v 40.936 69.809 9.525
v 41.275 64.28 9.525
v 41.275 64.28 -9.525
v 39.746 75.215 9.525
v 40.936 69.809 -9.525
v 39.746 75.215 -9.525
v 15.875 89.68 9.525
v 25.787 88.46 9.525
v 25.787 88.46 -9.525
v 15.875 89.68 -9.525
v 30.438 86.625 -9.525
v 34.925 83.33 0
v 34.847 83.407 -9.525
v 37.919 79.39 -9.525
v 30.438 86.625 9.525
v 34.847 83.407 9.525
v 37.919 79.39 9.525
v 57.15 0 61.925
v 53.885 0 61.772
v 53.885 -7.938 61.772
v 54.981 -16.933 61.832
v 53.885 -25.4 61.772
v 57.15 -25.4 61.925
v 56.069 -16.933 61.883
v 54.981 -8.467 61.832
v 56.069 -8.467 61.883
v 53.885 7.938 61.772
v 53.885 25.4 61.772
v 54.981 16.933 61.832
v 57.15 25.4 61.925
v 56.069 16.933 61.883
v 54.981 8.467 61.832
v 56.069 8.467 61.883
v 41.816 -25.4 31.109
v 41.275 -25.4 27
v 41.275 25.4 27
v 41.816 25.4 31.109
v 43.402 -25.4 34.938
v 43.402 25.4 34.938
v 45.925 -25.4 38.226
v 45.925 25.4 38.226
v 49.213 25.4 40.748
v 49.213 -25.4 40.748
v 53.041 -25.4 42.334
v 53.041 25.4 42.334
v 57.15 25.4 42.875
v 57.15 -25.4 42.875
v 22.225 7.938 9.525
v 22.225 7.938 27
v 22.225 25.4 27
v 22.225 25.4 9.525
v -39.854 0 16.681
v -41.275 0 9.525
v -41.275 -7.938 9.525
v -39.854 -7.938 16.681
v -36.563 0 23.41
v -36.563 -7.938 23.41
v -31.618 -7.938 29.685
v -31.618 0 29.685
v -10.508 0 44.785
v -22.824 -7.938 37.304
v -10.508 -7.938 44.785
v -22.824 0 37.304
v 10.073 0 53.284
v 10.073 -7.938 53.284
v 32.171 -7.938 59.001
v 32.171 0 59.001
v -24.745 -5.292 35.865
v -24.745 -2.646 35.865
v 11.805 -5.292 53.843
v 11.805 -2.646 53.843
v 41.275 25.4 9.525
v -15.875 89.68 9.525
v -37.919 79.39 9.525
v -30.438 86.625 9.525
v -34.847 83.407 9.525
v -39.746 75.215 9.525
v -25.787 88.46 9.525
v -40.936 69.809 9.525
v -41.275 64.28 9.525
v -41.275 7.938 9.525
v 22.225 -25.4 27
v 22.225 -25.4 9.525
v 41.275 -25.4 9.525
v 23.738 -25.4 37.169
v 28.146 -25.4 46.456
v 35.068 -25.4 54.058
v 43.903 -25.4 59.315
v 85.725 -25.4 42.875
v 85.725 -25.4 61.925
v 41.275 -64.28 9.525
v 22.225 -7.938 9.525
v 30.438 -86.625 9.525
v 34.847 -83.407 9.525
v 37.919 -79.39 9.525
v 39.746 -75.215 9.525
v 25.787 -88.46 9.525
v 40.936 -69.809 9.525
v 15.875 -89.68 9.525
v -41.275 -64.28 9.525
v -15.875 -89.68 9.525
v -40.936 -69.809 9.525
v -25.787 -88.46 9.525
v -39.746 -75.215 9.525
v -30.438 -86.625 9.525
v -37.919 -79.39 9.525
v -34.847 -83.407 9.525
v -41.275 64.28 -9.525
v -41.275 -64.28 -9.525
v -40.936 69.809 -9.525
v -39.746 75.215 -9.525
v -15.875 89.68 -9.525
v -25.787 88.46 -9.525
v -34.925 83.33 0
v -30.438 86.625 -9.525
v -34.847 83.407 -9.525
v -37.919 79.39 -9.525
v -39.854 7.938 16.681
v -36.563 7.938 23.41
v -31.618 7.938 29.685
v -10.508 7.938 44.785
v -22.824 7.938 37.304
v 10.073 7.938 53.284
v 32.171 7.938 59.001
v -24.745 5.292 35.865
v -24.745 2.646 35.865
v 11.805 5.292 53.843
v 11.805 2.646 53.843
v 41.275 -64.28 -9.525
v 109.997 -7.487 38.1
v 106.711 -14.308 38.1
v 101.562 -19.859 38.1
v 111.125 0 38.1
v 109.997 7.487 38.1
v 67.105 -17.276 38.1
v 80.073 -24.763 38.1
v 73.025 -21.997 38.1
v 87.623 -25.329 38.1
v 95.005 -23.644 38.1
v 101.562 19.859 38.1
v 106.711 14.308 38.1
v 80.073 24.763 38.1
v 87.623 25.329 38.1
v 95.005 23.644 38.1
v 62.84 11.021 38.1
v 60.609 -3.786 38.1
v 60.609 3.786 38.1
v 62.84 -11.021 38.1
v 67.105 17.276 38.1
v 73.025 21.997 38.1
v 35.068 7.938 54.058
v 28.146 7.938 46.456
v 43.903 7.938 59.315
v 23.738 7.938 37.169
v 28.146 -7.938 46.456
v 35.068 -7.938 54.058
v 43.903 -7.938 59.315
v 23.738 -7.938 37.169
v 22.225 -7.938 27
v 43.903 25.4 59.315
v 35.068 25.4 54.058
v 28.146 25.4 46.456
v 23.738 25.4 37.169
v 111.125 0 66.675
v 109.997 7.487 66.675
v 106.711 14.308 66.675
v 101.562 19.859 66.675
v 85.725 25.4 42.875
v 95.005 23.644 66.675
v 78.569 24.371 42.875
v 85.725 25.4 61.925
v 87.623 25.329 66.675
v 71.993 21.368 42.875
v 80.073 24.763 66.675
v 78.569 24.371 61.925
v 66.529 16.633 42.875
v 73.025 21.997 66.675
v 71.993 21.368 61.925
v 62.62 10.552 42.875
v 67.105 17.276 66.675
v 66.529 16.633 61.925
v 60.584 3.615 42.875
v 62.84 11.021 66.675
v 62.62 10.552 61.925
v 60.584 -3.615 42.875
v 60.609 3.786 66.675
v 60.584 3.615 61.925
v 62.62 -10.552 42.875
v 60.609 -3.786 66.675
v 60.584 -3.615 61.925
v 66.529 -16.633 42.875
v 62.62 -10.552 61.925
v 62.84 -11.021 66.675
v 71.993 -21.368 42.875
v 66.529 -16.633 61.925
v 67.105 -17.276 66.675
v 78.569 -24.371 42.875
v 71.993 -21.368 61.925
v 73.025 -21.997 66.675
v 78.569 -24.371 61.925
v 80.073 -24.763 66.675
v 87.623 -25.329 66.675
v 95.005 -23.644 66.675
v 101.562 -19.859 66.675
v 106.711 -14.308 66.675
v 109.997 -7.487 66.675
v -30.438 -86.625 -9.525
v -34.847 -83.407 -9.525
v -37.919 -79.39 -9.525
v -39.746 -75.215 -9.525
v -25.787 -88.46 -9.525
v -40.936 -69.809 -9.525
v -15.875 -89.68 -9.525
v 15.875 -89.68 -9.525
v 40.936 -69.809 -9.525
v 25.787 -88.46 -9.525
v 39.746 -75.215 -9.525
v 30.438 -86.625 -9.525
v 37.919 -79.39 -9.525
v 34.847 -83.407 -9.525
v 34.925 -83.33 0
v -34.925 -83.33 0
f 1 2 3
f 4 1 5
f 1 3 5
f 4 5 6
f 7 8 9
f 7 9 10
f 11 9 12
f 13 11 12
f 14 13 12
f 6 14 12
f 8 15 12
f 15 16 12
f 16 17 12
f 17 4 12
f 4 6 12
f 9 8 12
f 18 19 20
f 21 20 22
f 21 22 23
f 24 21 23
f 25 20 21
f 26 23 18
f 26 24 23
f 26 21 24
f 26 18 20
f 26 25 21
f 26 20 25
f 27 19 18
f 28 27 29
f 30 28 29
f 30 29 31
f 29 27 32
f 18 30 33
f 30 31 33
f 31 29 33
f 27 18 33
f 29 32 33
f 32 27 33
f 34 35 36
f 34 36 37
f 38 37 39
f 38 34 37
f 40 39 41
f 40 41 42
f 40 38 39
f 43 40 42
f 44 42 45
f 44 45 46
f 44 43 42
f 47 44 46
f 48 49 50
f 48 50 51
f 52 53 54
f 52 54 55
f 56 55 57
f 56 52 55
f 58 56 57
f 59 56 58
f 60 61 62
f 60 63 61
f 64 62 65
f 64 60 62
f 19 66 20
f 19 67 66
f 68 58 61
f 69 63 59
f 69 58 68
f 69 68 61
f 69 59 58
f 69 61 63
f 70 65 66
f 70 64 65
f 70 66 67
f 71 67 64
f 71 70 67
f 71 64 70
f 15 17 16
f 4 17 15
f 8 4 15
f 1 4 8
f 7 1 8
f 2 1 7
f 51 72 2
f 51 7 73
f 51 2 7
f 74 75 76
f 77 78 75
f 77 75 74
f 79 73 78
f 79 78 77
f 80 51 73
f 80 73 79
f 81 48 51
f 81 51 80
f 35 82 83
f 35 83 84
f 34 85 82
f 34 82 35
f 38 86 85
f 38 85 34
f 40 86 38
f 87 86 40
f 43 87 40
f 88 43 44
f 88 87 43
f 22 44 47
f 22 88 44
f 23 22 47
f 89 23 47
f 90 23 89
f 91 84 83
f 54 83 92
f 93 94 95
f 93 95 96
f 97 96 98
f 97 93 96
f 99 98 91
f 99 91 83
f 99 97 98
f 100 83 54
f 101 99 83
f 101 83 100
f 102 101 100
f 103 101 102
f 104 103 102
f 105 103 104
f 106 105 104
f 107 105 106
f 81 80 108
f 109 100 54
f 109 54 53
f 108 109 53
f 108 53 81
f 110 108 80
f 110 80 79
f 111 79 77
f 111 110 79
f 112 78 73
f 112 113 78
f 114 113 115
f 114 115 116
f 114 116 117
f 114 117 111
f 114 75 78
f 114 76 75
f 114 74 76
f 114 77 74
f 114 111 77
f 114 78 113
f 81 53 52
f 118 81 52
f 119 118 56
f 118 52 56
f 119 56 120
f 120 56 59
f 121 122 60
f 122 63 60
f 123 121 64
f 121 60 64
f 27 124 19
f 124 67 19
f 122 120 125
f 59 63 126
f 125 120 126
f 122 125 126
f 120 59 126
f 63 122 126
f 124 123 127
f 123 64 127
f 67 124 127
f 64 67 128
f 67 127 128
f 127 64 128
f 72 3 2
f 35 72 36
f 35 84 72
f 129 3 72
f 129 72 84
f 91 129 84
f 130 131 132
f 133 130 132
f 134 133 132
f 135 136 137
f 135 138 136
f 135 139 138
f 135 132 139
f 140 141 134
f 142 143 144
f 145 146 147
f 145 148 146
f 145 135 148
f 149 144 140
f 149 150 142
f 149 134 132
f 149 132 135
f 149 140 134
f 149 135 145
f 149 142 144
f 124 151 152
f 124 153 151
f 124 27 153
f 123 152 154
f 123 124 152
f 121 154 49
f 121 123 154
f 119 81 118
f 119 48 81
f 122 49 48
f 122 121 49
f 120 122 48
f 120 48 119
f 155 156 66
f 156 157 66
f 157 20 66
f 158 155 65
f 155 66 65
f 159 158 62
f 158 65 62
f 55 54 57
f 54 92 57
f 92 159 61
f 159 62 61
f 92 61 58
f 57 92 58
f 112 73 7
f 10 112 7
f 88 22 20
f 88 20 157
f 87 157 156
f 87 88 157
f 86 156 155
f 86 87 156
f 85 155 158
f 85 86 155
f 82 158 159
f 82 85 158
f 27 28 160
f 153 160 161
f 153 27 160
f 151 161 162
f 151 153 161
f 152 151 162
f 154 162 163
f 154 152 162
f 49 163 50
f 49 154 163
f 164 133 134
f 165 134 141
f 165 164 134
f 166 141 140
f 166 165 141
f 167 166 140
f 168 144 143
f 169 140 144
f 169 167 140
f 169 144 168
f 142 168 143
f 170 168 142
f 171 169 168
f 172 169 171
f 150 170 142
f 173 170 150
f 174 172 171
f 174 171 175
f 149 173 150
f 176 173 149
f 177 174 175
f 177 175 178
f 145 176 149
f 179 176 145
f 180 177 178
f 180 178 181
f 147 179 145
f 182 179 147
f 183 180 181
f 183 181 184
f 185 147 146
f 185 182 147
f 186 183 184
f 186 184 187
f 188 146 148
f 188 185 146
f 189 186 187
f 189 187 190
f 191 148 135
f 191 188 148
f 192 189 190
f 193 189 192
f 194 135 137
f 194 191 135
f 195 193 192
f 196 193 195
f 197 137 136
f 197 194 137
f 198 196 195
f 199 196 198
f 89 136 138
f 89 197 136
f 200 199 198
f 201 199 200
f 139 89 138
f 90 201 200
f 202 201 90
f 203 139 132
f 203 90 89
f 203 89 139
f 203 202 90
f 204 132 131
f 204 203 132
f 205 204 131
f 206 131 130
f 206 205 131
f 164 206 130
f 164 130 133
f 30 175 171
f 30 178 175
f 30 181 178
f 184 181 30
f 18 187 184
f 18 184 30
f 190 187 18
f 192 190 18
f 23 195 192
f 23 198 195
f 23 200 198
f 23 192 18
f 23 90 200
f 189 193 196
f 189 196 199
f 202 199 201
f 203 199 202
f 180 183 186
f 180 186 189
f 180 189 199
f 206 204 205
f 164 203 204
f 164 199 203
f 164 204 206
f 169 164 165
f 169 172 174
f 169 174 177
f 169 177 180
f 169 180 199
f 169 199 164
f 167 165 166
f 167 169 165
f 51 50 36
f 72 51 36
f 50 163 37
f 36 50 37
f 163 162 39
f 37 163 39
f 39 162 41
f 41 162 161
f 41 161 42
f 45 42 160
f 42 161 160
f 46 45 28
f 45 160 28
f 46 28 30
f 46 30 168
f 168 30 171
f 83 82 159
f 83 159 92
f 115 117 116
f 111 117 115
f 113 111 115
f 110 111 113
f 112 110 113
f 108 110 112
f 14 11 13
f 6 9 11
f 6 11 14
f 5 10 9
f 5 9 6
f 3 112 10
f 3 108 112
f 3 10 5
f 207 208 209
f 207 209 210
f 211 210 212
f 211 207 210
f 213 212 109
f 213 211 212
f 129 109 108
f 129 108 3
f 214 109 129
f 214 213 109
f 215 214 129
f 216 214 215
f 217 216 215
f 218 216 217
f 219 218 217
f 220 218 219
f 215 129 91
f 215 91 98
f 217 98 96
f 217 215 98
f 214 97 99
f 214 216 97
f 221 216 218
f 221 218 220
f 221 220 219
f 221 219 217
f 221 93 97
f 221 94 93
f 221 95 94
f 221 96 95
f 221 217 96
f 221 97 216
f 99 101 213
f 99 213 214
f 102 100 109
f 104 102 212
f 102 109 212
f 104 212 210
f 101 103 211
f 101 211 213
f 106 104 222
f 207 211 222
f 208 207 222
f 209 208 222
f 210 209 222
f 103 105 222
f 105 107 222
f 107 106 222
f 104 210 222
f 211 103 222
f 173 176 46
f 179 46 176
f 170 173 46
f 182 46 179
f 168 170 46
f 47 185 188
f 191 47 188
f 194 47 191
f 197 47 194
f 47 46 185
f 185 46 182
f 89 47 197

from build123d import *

# Parameters (mm, degrees)
F1_DEPTH    = 89.68002
F0_W        = 25.4
F0_H        = 19.05
F2_DEPTH    = 25.4
F3_DEPTH    = 7.9375
F5_T1_DEPTH = 146.05


# Not quite as in the source:
# - a fillet or chamfer that OpenCascade refuses, or shapes differently, is made with other operations: its cross-section is extruded or revolved along the edge and cut away or added


with BuildPart() as f1:
    # F0 (on Front) → F1 (new body, symmetric)
    with BuildSketch(Plane.XZ):
        Polygon((22.225, 9.525), (-41.275, 9.525), (-41.275, -9.525), (41.275, -9.525), (41.275, 9.525), align=None)
    extrude(amount=F1_DEPTH, both=True)

    # F0 (on Front) → F2 (join, symmetric)
    with BuildSketch(Plane.XZ):
        with BuildLine():
            Line((22.225, 27.0002), (22.225, 9.525))
            Line((22.225, 9.525), (41.275, 9.525))
            Line((41.275, 9.525), (41.275, 27.0002))
            ThreePointArc((41.275, 27.0002), (45.9246798487, 38.2255201513), (57.15, 42.8752))
            Line((57.15, 42.8752), (60.325, 42.8752))
            Line((60.325, 42.8752), (60.325, 61.9252))
            Line((60.325, 61.9252), (57.15, 61.9252))
            add(Edge.make_bspline(
                [(53.8854342407, 61.7722898912), (54.9842067368, 61.8365871986), (56.0728453275, 61.8876096574), (57.15, 61.9252)],
                knots=[108.5245810491, 108.5245810491, 108.5245810491, 108.5245810491, 111.5045361635, 111.5045361635, 111.5045361635, 111.5045361635], degree=3))
            ThreePointArc((53.8854342407, 61.7722898912), (31.3258777096, 50.5133948686), (22.225, 27.0002))
        make_face()
        with Locations((73.025, 52.4002)):
            Rectangle(F0_W, F0_H)
    extrude(amount=F2_DEPTH, both=True)

    # F0 (on Front) → F3 (join, symmetric)
    with BuildSketch(Plane.XZ):
        with BuildLine():
            add(Edge.make_bspline(
                [(-41.275, 9.525), (-39.5856284224, 39.4828766469), (13.870125209, 59.4306981306), (53.8854342407, 61.7722898912)],
                knots=[0, 0, 0, 0, 108.5245810491, 108.5245810491, 108.5245810491, 108.5245810491], degree=3))
            Line((-41.275, 9.525), (22.225, 9.525))
            Line((22.225, 9.525), (22.225, 27.0002))
            ThreePointArc((22.225, 27.0002), (31.3258777096, 50.5133948686), (53.8854342407, 61.7722898912))
        make_face()
    extrude(amount=F3_DEPTH, both=True)

    # F0 (on Front) → F4 (revolve)
    with BuildSketch(Plane.XZ):
        Polygon((85.725, 66.675), (85.725, 61.9252), (85.725, 42.8752), (85.725, 38.1), (111.125, 38.1), (111.125, 66.675), align=None)
    revolve(axis=Axis((85.725, 0, 52.3875), (0, 0, 1)))

    # F5: fillet of radius 25.4 on 4 edges, made by hand

    # F5_s2 → F5_t1 (cut)
    with BuildSketch(Plane.XY.offset(-73.025)):
        with BuildLine():
            add(Edge.make_bspline(
                [(41.275, -64.28002), (41.275, -89.68002), (15.875, -89.68002)],
                knots=[0, 0, 0, 1, 1, 1], degree=2, weights=[1, 1, 1]))
            Line((15.875, -89.68002), (41.275, -89.68002))
            Line((41.275, -89.68002), (41.275, -64.28002))
        make_face()
        with BuildLine():
            add(Edge.make_bspline(
                [(-41.275, -64.28002), (-41.275, -89.68002), (-15.875, -89.68002)],
                knots=[0, 0, 0, 1, 1, 1], degree=2, weights=[1, 1, 1]))
            Line((-15.875, -89.68002), (-41.275, -89.68002))
            Line((-41.275, -89.68002), (-41.275, -64.28002))
        make_face()
        with BuildLine():
            add(Edge.make_bspline(
                [(41.275, 64.28002), (41.275, 89.68002), (15.875, 89.68002)],
                knots=[0, 0, 0, 1, 1, 1], degree=2, weights=[1, 1, 1]))
            Line((15.875, 89.68002), (41.275, 89.68002))
            Line((41.275, 89.68002), (41.275, 64.28002))
        make_face()
        with BuildLine():
            add(Edge.make_bspline(
                [(-41.275, 64.28002), (-41.275, 89.68002), (-15.875, 89.68002)],
                knots=[0, 0, 0, 1, 1, 1], degree=2, weights=[1, 1, 1]))
            Line((-15.875, 89.68002), (-41.275, 89.68002))
            Line((-41.275, 89.68002), (-41.275, 64.28002))
        make_face()
    extrude(amount=F5_T1_DEPTH, mode=Mode.SUBTRACT)


solid = f1.part
